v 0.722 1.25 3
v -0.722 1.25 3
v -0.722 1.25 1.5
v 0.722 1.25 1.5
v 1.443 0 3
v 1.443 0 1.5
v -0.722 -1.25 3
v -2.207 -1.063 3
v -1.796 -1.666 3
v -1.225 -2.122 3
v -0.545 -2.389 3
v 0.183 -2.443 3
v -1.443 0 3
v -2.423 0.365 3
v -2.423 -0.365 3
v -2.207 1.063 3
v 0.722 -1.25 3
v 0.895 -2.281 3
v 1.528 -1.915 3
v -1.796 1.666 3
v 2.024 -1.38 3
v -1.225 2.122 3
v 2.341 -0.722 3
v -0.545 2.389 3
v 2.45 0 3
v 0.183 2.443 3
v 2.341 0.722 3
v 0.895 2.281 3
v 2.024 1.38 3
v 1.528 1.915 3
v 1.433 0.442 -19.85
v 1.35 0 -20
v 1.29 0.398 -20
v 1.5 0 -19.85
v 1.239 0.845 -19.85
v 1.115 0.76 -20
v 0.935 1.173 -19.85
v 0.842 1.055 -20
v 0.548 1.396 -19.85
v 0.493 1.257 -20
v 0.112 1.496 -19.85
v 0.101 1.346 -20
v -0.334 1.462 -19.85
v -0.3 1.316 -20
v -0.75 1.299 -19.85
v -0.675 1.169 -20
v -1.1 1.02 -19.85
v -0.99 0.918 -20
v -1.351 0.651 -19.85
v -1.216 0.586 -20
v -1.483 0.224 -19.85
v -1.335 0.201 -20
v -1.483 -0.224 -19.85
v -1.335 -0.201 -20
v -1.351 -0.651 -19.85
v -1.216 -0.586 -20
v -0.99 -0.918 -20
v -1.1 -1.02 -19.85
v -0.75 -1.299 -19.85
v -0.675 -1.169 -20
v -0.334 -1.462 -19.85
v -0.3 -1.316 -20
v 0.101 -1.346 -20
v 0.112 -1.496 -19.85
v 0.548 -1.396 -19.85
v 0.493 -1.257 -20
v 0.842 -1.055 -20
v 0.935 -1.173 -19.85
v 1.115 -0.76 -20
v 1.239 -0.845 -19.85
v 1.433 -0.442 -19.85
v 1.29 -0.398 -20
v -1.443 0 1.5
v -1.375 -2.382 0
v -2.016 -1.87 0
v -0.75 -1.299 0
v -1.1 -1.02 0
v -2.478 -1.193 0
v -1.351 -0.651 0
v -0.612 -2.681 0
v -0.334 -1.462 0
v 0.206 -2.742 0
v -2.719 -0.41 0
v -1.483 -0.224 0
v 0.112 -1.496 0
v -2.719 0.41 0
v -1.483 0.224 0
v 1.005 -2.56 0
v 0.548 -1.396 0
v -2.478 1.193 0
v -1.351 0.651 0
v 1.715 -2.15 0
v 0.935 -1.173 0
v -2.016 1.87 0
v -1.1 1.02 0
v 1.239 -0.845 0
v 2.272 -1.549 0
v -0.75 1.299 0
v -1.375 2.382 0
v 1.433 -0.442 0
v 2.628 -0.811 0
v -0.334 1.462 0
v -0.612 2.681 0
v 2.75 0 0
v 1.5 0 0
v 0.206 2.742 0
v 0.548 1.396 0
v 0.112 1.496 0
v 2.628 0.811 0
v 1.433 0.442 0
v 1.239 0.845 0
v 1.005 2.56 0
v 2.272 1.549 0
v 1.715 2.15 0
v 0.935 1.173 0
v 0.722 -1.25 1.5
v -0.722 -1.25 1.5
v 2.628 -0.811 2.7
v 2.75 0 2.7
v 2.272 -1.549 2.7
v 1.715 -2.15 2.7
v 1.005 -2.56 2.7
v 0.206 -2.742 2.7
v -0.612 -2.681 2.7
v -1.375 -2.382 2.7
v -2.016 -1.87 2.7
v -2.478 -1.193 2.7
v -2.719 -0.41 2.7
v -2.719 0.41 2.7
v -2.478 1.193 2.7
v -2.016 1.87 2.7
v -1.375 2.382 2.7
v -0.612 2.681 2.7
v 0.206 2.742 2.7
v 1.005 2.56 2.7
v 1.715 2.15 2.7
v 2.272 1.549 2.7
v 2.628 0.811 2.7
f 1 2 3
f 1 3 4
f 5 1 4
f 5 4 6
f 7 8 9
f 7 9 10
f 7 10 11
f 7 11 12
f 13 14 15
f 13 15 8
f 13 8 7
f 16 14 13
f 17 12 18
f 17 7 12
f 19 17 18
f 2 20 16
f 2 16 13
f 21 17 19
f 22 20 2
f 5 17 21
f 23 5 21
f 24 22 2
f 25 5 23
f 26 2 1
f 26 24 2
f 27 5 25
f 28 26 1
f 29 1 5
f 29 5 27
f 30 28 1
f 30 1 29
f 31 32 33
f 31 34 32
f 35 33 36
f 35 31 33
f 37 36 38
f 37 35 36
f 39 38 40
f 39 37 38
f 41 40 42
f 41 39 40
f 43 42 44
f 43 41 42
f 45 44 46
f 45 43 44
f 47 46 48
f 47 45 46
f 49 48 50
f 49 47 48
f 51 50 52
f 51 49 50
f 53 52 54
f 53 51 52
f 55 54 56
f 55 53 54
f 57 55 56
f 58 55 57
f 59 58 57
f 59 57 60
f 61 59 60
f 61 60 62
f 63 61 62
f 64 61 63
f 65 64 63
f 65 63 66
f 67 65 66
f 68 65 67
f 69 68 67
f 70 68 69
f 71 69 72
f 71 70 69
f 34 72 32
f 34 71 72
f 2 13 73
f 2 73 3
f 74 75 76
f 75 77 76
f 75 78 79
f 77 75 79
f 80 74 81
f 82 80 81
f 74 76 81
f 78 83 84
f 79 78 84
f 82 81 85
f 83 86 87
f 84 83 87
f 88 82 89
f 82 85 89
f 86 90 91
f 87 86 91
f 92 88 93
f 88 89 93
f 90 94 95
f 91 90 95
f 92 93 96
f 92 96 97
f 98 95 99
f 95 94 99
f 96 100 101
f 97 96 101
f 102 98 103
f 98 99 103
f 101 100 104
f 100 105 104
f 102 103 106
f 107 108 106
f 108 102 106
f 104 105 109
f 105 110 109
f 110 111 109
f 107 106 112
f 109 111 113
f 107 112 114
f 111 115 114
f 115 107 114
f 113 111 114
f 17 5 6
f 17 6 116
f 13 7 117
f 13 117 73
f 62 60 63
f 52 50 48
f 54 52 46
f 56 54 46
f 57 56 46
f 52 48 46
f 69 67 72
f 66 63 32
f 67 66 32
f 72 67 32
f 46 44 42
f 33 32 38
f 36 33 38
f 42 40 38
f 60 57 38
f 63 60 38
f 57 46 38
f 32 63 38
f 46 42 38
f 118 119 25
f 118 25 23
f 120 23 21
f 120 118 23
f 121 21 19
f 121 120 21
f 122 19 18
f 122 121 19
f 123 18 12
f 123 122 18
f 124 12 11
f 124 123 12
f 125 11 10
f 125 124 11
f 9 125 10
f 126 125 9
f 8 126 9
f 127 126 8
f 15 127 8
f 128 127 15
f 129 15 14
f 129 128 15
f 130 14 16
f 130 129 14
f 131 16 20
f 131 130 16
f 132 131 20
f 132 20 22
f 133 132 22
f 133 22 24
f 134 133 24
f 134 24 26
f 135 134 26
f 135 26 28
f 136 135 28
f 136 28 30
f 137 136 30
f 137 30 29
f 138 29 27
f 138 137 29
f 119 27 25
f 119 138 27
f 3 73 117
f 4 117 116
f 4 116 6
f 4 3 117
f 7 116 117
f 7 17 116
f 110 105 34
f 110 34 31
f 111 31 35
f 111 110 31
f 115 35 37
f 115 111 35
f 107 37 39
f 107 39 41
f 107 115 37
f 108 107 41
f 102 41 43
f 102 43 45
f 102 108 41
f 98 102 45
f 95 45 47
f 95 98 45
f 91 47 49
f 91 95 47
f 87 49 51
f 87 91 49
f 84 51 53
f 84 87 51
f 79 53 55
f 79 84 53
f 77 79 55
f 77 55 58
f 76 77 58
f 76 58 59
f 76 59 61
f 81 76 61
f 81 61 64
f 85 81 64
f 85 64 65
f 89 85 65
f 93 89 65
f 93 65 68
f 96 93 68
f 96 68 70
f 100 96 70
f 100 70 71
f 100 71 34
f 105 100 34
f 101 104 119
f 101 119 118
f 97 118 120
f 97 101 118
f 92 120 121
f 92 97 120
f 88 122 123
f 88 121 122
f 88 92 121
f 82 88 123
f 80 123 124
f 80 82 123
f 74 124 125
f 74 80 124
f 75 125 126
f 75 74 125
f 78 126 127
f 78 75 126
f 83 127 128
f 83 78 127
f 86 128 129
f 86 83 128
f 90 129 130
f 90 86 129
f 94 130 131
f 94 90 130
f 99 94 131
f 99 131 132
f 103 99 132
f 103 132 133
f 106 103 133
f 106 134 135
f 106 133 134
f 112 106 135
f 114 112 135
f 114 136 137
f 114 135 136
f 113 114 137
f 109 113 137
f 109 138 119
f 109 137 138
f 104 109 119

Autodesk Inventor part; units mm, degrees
ref_plane "YZ Plane" through (0, 0, 0) normal (1, 0, 0) x (0, 1, 0)
ref_plane "XZ Plane" through (0, 0, 0) normal (0, 1, 0) x (-1, 0, 0)
ref_plane "XY Plane" through (0, 0, 0) normal (0, 0, 1) x (1, 0, 0)
sketch "Sketch3" plane through (0, 0, 0) normal (0, 0, 1) x (1, 0, 0)
  circle A0 centre (0, 0) radius 1.5
  dimension "Diameter" = 3
extrude "Extrusion1" add sketch "Sketch3" against normal blind 20
sketch "Sketch4" plane through (0, 0, 0) normal (0, 0, 1) x (1, 0, 0)
  circle A0 centre (0, 0) radius 1.5 projected
  circle A1 centre (0, 0) radius 2.75
  dimension "Head_Diameter" = 5.5
extrude "Extrusion2" add sketch "Sketch4" along normal blind 3 contours A0 | A1
sketch "Sketch5" plane through (0, 0, 3) normal (0, 0, 1) x (1, 0, 0)
  circle A0 centre (0, 0) radius 2.75 projected
  line L0 (1.4434, 0) -> (0.7217, -1.25)
  line L1 (0.7217, -1.25) -> (-0.7217, -1.25)
  line L2 (-0.7217, -1.25) -> (-1.4434, 0)
  line L3 (-1.4434, 0) -> (-0.7217, 1.25)
  line L4 (-0.7217, 1.25) -> (0.7217, 1.25)
  line L5 (0.7217, 1.25) -> (1.4434, 0)
  line L6 (0, 0) -> (1.4434, 0) construction
  dimension "Hex_Width" = 2.5
extrude "Extrusion3" cut sketch "Sketch5" against normal blind 1.5 contours L0 L1 L2 L3 L4 L5
thread "Thread1" size "M3x0.5" class "4g6g" standard "ANSI Metric M Profile" length 20
chamfer "Chamfer1" distance 0.3 angle 45 1 edges at (-2.75, 0, 3)
chamfer "Chamfer2" distance 0.15 angle 45 1 edges at (-1.5, 0, -20)
equation "\"d14\" = 0.5 * Chamfer"
equation "\"Chamfer\" = 0.3"
properties part number "SCREW,SOCKET-HD,P,12_9,M03X0_5X20MM" material "Steel, MS"
